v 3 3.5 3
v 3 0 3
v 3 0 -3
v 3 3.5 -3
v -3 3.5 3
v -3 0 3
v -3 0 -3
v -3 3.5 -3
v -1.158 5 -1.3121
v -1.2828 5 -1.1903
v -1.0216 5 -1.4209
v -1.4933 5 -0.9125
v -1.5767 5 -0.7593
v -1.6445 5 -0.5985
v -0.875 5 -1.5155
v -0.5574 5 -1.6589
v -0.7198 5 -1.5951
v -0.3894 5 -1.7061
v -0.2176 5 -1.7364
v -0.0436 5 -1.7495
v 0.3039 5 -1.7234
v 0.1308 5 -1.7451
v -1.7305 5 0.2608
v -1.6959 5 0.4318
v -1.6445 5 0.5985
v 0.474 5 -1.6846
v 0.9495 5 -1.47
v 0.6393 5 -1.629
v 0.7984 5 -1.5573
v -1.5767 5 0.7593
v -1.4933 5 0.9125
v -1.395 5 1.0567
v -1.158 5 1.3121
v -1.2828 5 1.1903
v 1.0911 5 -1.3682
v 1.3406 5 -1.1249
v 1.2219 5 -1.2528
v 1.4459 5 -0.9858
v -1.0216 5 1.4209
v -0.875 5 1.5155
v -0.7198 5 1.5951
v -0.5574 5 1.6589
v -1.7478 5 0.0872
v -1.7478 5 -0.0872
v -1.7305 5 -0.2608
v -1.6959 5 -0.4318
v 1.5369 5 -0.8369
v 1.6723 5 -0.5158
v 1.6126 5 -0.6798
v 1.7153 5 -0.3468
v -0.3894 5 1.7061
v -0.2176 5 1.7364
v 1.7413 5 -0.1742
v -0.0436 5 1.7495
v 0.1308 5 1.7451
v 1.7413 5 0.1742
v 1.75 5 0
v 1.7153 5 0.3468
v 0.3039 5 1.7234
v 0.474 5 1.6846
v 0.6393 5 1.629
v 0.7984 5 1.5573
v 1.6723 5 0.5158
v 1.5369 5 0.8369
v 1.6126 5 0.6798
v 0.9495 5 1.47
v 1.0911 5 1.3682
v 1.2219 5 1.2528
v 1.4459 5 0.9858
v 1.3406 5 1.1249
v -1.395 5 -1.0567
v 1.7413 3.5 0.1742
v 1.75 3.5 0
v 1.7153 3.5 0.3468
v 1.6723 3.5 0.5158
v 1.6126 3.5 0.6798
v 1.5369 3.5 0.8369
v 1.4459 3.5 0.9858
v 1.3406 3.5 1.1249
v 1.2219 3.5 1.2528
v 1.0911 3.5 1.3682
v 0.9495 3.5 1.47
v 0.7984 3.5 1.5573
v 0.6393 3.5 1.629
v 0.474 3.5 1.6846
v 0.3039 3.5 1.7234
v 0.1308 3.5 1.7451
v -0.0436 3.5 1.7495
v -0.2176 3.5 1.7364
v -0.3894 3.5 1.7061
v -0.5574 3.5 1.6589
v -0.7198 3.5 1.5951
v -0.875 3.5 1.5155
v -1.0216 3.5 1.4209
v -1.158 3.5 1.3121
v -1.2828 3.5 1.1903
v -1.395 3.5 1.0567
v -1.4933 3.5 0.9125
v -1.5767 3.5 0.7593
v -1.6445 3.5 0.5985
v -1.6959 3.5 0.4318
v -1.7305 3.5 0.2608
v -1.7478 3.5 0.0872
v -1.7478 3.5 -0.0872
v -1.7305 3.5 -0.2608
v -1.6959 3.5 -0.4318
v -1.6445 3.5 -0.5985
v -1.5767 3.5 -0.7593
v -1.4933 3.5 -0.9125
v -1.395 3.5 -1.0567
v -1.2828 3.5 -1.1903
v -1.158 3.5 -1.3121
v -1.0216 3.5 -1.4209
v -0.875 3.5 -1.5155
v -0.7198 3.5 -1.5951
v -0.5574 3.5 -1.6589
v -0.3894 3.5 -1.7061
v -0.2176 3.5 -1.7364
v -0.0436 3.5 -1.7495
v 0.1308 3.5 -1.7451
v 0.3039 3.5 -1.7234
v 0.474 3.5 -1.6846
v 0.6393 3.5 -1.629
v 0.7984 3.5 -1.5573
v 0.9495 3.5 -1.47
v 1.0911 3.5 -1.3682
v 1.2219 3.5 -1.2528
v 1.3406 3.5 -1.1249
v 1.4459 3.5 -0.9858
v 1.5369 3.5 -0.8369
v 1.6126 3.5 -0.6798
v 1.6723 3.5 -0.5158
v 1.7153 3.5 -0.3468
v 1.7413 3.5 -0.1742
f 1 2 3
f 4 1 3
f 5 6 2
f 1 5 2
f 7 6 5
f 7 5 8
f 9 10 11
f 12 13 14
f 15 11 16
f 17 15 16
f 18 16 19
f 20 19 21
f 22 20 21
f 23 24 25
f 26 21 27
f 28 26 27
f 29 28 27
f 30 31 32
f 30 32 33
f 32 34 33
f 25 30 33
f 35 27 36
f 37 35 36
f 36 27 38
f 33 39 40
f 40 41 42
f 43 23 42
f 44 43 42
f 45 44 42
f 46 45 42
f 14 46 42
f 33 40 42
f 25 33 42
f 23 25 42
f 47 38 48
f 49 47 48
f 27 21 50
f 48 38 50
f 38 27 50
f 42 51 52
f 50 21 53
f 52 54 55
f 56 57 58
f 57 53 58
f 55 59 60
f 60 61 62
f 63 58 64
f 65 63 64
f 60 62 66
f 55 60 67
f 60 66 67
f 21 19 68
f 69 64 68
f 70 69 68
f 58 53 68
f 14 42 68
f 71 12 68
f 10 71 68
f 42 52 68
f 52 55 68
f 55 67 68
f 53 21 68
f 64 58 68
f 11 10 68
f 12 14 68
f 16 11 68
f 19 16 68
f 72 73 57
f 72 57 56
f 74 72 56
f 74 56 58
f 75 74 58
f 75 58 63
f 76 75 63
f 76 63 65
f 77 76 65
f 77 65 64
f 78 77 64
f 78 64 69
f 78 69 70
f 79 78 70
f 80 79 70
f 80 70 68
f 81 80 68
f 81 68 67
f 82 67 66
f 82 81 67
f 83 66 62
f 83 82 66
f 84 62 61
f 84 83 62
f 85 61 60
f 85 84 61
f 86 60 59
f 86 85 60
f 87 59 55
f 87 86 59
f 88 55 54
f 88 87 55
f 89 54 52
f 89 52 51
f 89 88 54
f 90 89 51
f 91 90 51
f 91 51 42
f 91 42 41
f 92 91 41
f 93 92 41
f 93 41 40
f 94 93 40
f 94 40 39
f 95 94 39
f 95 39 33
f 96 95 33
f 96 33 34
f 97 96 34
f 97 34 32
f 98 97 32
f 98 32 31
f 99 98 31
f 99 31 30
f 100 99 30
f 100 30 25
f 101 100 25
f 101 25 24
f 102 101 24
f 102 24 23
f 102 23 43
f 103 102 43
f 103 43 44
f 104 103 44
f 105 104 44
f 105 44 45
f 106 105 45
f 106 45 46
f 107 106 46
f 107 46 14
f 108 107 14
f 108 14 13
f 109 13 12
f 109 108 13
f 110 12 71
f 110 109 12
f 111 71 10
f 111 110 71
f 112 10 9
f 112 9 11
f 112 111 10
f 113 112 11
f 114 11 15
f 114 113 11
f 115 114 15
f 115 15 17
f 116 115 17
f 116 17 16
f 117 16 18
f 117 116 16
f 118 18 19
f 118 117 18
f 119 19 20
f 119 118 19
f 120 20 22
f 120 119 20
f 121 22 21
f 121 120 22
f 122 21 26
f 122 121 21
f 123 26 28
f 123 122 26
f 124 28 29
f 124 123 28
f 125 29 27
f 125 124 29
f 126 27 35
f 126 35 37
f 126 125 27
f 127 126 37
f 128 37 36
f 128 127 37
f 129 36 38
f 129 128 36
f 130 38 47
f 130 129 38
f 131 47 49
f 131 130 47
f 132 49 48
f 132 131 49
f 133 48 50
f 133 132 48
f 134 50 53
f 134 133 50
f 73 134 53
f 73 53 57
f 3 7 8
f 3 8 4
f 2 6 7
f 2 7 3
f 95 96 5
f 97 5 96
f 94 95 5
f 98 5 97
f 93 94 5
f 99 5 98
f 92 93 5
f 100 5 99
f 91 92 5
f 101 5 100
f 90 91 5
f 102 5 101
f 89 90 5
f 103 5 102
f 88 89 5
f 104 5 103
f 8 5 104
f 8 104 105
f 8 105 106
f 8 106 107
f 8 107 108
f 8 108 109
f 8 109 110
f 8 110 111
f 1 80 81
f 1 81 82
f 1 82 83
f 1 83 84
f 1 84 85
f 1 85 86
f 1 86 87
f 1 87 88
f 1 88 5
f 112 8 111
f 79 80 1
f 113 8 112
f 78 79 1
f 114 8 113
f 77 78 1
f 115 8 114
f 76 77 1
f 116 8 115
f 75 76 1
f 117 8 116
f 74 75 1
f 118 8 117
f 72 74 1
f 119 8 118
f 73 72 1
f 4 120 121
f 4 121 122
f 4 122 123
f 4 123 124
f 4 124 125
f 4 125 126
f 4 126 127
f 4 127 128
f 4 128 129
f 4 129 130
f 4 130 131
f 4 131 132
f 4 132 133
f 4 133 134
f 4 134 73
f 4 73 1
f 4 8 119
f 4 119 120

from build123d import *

# Parameters (mm, degrees)
SKETCH_1_W      = 6
SKETCH_1_H      = 6
EXTRUDE_1_DEPTH = 3.5
SKETCH_2_R      = 1.75
EXTRUDE_2_DEPTH = 5


with BuildPart() as part:
    # 草图1 → 凸台-拉伸1 (new body)
    with BuildSketch(Plane(origin=(0, 0, 0), x_dir=(1, 0, 0), z_dir=(0, 1, 0))):
        Rectangle(SKETCH_1_W, SKETCH_1_H)
    extrude(amount=EXTRUDE_1_DEPTH)

    # 草图2 → 凸台-拉伸2 (add)
    with BuildSketch(Plane.XZ):
        Circle(SKETCH_2_R)
    extrude(amount=-EXTRUDE_2_DEPTH)


solid = part.part
